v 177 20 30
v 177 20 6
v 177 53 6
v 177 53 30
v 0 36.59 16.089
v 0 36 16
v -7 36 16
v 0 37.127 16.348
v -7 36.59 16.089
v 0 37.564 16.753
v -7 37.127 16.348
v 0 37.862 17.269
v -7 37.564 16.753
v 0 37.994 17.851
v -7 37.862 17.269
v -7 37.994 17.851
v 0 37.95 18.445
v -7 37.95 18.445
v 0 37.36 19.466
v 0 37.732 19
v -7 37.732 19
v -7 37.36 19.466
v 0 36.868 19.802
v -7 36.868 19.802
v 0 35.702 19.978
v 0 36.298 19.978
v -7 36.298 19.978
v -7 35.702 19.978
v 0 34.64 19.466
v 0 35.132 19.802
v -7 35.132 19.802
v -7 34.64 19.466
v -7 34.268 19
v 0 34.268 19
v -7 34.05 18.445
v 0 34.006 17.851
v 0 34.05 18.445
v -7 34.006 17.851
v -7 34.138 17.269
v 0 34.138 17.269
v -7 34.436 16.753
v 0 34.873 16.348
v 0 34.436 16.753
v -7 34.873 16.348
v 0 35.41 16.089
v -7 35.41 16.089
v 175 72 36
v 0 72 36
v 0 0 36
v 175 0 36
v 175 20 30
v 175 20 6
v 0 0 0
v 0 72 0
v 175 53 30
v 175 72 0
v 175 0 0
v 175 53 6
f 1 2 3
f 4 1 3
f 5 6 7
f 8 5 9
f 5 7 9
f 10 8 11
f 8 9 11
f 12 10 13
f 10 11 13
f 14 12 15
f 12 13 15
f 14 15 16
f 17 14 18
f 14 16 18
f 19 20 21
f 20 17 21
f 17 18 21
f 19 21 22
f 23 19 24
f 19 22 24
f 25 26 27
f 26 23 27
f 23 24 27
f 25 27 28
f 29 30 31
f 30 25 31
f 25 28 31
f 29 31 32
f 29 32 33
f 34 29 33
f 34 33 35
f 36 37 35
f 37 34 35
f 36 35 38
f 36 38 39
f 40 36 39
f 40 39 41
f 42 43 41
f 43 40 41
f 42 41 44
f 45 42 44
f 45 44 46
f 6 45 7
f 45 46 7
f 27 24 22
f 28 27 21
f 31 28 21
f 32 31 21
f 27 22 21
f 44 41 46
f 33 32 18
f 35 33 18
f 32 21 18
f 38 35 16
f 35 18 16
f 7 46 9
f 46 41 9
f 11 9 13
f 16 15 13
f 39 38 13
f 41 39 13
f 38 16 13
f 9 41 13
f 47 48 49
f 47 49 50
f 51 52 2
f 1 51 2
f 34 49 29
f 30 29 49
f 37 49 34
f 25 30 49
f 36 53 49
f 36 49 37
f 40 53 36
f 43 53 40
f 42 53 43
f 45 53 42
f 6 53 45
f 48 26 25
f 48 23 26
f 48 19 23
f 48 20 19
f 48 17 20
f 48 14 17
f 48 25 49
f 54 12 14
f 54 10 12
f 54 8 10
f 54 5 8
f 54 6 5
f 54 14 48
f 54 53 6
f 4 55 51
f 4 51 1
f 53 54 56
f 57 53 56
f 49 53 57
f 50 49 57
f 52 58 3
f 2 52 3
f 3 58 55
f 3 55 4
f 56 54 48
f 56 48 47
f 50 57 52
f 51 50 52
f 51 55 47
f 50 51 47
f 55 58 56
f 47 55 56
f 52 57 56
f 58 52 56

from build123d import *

# Parameters (mm, degrees)
CYLINDER_R     = 2
CYLINDER_DEPTH = 11
BOX_W          = 175
BOX_H          = 72
BOX_DEPTH      = 36
BOX002_W       = 7
BOX002_H       = 4
BOX002_DEPTH   = 10
BOX003_W       = 10
BOX003_H       = 33
BOX003_DEPTH   = 24


with BuildPart() as f_24v_cable:
    # Cylinder → Cylinder (new body)
    with BuildSketch(Plane(origin=(-7, 36, 18), x_dir=(0, 0, -1), z_dir=(1, 0, 0))):
        Circle(CYLINDER_R)
    extrude(amount=CYLINDER_DEPTH)


with BuildPart() as powerbrick_mw_gst160a:
    # Box → Box (new body)
    with BuildSketch(Plane.XY):
        with Locations((87.5, 36)):
            Rectangle(BOX_W, BOX_H)
    extrude(amount=BOX_DEPTH)


with BuildPart() as led:
    # Box002 → Box002 (new body)
    with BuildSketch(Plane(origin=(5, 18, 26), x_dir=(1, 0, 0), z_dir=(0, 0, 1))):
        with Locations((3.5, 2)):
            Rectangle(BOX002_W, BOX002_H)
    extrude(amount=BOX002_DEPTH)


with BuildPart() as fusion:
    # Box003 → Box003 (new body)
    with BuildSketch(Plane(origin=(167, 20, 6), x_dir=(1, 0, 0), z_dir=(0, 0, 1))):
        with Locations((5, 16.5)):
            Rectangle(BOX003_W, BOX003_H)
    extrude(amount=BOX003_DEPTH)

    # Fusion: union 24V Cable, Powerbrick-mw-gst160a, LED
    add(f_24v_cable.part)
    add(powerbrick_mw_gst160a.part)
    add(led.part)


solid = fusion.part
